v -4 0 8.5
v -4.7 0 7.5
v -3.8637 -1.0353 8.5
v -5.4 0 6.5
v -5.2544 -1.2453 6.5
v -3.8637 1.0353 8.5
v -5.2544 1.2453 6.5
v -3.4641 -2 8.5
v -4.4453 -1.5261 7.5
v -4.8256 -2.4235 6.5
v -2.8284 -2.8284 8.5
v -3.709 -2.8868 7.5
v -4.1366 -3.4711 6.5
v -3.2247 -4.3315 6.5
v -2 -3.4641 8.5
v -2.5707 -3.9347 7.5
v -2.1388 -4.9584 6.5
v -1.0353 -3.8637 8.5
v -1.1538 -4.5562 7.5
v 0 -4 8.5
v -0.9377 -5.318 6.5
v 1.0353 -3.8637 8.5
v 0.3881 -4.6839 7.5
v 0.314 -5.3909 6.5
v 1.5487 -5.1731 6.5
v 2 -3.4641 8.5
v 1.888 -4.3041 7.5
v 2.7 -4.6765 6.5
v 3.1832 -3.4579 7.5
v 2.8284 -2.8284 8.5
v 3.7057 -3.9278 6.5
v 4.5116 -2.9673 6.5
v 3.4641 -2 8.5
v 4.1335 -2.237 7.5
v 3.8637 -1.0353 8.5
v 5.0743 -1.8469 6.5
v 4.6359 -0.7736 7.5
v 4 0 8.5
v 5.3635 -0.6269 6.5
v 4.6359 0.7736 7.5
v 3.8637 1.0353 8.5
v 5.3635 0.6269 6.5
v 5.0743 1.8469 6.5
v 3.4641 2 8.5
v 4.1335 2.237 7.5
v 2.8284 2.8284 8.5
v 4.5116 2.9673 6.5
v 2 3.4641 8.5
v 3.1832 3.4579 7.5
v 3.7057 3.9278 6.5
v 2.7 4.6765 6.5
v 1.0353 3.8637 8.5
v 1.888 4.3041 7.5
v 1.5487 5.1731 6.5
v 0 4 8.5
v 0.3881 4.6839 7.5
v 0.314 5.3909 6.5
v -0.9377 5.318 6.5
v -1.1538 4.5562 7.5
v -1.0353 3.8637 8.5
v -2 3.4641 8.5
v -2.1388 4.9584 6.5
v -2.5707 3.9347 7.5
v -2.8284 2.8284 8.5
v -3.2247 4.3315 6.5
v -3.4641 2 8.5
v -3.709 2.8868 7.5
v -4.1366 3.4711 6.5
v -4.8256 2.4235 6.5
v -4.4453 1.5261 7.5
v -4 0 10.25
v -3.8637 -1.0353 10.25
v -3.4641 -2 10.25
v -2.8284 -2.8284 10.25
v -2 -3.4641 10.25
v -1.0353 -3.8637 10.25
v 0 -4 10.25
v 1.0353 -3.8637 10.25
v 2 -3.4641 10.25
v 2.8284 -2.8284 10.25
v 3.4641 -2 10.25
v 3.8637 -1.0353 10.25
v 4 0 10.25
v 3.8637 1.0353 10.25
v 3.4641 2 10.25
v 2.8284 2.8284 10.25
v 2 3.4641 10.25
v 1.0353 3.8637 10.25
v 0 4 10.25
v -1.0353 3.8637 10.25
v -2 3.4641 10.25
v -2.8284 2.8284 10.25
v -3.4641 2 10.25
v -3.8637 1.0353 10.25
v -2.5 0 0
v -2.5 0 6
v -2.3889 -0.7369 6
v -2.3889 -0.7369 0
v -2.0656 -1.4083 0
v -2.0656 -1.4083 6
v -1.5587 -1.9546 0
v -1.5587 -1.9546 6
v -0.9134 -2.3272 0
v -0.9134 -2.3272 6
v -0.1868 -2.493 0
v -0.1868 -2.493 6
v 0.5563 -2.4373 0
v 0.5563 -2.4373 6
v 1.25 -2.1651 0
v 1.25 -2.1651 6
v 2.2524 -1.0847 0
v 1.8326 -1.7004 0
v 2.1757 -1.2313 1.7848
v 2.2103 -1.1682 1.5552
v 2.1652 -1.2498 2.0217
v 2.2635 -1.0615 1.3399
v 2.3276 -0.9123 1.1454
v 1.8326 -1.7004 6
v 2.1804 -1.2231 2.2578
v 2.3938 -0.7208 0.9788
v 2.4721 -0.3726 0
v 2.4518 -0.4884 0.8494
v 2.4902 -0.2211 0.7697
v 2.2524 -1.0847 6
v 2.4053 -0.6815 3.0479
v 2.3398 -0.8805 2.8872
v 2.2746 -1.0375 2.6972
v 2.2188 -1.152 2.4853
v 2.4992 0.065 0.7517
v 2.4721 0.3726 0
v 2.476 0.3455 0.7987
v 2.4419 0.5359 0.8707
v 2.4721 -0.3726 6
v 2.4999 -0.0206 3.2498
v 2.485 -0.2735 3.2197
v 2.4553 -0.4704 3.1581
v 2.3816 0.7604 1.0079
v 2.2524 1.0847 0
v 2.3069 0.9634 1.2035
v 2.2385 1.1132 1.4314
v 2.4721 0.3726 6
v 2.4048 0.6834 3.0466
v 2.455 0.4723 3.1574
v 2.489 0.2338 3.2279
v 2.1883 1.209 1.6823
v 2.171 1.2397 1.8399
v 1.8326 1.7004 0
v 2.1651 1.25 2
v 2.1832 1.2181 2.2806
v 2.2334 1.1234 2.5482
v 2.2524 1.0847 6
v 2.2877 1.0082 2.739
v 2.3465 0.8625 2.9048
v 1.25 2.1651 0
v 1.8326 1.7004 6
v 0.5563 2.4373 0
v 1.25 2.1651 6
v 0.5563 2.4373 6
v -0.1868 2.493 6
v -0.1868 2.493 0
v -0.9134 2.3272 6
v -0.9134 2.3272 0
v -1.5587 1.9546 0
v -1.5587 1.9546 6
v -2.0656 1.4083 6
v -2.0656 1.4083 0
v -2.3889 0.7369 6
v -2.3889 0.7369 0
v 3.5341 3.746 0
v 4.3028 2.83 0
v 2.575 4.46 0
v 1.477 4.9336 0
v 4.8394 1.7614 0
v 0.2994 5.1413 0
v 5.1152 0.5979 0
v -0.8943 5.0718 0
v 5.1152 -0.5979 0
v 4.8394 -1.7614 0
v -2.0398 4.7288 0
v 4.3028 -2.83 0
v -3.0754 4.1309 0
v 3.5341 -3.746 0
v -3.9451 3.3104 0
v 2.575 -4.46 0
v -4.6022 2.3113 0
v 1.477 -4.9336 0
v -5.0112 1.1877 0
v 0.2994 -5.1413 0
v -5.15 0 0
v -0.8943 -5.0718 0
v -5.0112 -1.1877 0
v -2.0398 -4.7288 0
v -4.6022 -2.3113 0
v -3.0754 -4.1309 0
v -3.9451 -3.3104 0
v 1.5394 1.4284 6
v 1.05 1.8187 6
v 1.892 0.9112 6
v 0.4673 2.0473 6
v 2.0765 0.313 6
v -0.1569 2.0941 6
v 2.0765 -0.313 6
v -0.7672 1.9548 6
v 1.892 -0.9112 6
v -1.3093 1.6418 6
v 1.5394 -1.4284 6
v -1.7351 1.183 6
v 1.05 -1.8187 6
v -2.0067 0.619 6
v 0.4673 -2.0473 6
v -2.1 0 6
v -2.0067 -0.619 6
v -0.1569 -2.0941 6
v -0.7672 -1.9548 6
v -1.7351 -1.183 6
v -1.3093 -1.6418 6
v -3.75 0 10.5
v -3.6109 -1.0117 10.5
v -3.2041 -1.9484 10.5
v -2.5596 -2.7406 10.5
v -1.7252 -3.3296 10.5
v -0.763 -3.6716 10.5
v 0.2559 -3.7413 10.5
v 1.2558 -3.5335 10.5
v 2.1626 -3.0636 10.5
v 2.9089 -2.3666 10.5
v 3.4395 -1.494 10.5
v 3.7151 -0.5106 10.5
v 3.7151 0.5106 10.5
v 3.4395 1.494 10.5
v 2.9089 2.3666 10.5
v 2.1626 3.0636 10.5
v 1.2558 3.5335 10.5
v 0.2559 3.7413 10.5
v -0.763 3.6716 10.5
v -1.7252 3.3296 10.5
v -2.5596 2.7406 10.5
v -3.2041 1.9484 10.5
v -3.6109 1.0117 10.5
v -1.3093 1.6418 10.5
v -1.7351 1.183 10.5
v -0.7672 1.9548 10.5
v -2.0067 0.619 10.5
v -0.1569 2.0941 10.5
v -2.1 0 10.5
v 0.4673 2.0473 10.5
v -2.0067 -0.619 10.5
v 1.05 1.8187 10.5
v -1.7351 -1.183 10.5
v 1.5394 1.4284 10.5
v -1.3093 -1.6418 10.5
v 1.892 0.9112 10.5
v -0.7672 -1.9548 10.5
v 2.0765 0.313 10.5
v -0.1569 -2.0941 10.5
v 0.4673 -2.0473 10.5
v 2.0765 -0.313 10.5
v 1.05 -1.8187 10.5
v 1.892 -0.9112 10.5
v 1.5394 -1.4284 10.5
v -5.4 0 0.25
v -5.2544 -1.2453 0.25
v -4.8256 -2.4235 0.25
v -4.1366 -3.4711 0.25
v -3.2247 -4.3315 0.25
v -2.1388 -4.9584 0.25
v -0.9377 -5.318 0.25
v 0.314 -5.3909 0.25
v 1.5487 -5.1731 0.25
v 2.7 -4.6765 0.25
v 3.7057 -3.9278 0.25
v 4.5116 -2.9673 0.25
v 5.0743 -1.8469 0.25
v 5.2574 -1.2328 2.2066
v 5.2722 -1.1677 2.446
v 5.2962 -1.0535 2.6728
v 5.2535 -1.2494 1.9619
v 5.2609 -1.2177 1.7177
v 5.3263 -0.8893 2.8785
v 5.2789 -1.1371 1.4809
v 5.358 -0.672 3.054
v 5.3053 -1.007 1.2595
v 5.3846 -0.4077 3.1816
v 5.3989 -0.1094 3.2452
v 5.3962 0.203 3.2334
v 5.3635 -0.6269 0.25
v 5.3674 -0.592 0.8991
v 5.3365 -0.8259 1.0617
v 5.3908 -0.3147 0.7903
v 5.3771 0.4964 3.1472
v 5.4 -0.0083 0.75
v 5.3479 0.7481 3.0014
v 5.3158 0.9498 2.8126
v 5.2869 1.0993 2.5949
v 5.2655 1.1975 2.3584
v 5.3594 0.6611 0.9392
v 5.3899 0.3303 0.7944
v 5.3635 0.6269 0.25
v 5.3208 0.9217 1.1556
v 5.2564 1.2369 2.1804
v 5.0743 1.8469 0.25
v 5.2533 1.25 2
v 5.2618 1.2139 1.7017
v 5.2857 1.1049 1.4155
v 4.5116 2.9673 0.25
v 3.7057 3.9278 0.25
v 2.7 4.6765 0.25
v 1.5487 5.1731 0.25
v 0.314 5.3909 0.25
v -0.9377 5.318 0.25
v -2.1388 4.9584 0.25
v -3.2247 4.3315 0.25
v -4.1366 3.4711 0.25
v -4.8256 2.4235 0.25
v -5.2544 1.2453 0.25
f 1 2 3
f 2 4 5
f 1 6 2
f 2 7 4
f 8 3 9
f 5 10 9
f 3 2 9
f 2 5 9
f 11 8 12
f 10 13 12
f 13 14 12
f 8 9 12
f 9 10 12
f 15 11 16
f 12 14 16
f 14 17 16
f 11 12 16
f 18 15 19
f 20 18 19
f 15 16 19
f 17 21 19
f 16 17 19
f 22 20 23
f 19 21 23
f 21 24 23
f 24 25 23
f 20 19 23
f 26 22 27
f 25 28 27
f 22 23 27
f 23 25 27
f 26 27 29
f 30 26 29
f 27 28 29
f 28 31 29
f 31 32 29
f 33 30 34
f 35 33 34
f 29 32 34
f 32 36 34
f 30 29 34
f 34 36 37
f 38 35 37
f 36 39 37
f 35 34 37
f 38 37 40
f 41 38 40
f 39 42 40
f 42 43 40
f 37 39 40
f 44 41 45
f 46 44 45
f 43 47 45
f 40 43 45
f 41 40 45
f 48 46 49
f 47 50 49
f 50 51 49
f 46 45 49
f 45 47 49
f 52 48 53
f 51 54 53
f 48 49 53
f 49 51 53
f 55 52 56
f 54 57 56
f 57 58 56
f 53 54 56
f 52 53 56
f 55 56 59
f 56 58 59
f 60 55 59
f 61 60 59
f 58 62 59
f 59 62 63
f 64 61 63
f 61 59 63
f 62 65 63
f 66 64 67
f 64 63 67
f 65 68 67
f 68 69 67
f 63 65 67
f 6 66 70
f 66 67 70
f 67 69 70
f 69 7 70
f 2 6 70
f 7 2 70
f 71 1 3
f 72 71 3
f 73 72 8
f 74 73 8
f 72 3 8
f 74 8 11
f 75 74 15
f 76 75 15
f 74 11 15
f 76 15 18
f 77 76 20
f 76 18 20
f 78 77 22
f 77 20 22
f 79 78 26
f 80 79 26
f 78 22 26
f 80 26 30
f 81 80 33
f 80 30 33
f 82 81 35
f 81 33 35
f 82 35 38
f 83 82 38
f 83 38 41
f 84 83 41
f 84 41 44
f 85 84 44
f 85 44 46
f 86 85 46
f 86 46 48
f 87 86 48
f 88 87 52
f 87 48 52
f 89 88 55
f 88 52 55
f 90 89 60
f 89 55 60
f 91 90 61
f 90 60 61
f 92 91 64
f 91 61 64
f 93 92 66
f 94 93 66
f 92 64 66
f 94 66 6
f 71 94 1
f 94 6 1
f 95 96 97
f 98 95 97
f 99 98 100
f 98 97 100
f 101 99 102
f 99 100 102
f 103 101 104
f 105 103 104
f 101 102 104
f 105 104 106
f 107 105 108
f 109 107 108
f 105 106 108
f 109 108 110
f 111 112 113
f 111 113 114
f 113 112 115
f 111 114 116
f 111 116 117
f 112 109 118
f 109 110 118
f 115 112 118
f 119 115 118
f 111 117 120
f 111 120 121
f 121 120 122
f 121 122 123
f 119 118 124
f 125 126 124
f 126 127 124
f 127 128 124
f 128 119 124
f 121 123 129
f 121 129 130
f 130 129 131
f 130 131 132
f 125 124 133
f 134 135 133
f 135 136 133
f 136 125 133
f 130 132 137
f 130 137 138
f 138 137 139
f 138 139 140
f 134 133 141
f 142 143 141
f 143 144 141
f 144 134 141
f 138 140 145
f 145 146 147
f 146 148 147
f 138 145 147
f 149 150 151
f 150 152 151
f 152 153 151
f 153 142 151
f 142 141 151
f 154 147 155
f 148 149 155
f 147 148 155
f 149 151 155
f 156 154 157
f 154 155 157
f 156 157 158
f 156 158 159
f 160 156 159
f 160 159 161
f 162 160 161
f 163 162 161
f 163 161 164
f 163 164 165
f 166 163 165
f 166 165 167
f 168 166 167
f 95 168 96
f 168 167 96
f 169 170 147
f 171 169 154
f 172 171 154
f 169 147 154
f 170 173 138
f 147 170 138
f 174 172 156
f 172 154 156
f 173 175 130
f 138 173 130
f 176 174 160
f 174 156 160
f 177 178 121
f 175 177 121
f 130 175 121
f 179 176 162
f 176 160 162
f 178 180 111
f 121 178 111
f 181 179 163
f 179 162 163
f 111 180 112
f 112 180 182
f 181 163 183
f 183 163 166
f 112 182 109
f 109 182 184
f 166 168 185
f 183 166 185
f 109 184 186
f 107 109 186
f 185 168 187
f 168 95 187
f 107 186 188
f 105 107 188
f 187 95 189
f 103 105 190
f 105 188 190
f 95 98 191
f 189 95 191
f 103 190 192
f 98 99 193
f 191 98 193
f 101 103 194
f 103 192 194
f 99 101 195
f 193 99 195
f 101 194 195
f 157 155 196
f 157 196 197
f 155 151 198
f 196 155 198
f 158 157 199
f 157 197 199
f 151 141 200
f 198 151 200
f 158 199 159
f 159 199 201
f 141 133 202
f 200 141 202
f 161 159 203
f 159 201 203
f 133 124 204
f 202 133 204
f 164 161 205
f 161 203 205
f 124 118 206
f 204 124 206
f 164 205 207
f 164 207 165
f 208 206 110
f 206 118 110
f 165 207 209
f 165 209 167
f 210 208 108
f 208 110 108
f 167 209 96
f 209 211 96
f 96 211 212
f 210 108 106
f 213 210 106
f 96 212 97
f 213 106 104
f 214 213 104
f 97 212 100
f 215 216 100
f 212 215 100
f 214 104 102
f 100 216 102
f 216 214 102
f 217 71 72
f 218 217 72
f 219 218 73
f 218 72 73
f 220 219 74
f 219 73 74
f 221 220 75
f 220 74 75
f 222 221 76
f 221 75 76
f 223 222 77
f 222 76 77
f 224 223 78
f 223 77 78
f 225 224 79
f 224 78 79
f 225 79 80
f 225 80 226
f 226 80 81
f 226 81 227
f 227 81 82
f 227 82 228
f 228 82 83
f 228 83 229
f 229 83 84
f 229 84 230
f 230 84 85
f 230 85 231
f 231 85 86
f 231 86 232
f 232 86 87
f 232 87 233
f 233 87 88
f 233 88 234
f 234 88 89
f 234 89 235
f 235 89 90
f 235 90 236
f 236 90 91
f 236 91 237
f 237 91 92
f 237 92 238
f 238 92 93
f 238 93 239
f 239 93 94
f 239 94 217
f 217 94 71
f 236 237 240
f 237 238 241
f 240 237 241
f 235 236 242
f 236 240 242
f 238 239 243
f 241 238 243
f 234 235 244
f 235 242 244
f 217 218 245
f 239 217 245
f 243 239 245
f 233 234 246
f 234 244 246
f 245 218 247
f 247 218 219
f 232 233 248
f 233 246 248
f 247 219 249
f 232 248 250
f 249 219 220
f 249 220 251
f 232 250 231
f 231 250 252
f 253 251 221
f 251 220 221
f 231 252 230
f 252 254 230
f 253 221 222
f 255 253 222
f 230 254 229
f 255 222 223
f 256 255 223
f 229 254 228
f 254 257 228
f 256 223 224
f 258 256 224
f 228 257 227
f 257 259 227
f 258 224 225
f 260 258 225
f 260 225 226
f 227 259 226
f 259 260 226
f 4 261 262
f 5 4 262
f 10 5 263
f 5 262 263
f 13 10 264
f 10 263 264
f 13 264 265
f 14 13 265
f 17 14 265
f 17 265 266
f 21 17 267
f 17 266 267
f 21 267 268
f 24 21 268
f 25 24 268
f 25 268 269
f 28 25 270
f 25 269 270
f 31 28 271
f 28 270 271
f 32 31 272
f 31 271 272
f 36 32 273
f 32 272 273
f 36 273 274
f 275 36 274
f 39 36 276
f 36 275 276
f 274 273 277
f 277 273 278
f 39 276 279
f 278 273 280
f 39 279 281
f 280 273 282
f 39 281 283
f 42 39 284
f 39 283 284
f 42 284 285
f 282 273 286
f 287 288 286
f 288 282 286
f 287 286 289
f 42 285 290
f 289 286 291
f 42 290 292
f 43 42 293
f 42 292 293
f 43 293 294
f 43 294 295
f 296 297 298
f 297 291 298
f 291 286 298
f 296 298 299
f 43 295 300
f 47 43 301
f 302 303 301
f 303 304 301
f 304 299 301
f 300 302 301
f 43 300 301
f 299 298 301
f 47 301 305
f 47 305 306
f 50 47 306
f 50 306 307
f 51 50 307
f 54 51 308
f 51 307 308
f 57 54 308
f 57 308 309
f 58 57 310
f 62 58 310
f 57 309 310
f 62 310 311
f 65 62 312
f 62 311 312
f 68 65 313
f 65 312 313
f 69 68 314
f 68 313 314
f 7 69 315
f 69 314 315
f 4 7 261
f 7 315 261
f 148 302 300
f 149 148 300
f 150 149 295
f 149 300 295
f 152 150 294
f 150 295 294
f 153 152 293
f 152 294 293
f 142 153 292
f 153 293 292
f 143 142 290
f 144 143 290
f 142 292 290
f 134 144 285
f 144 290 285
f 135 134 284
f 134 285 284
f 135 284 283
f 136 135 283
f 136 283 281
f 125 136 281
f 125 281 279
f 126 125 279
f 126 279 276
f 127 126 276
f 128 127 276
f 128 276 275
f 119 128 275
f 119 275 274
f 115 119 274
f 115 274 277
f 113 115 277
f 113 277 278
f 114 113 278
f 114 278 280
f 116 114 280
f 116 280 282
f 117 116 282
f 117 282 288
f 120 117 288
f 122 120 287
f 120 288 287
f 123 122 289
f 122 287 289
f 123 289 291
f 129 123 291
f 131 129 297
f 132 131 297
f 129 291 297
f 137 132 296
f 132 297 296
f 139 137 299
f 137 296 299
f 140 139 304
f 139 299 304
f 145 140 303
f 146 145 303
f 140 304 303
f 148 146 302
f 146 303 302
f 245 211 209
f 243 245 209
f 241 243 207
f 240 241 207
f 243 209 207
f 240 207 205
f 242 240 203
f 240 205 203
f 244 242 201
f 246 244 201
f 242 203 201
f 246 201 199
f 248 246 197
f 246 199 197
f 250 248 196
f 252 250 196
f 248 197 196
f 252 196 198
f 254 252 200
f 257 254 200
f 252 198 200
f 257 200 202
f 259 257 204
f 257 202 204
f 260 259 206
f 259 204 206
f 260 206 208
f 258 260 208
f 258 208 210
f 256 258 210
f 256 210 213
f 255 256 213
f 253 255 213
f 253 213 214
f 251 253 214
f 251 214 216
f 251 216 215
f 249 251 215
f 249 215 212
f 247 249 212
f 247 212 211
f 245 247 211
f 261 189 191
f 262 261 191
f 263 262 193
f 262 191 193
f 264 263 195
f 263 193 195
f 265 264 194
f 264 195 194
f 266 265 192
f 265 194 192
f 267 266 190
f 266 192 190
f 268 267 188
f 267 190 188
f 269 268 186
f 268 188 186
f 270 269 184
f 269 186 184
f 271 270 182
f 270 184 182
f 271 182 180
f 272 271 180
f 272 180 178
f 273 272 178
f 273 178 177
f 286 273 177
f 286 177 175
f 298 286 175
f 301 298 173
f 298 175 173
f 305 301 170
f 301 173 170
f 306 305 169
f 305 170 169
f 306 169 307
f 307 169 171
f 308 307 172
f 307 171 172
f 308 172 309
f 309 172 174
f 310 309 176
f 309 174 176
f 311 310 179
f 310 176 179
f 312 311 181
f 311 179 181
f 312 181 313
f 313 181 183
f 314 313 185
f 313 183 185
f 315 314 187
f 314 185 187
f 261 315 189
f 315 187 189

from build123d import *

# Parameters (mm, degrees)
CONNECTOR_M5X0_8_TAPPED_HOLE_D        = 4.2
CONNECTOR_M5X0_8_TAPPED_HOLE_DEPTH    = 7.4
CONNECTOR_M5X0_8_TAPPED_HOLE_TIP      = 1.2618073
SET_SCREW_1_M3X0_5_TAPPED_HOLE_REACH  = 16.767
SET_SCREW_1_M3X0_5_TAPPED_HOLE_BORE_R = 1.25
EDGE_CHAMFERS_SIZE                    = 0.25


with BuildPart() as part:
    # Body Sketch → Body Revolve (revolve)
    with BuildSketch(Plane(origin=(0, 0, 0), x_dir=(-1, 0, 0), z_dir=(0, 1, 0))):
        Polygon((1, 10.5), (4, 10.5), (4, 8.5), (5.4, 6.5), (5.4, 0), (2.5, 0), (2.5, 6), (1, 6), align=None)
    revolve(axis=Axis((0, 0, 0), (0, 0, 1)))

    # Connector M5x0.8 Tapped Hole
    with Locations(Plane.XY.offset(10.5)):
        with Locations((0, 0)):
            Hole(CONNECTOR_M5X0_8_TAPPED_HOLE_D / 2, depth=CONNECTOR_M5X0_8_TAPPED_HOLE_DEPTH)
            with Locations((0, 0, -(CONNECTOR_M5X0_8_TAPPED_HOLE_DEPTH + CONNECTOR_M5X0_8_TAPPED_HOLE_TIP / 2))):  # 118° drill point
                Cone(0, CONNECTOR_M5X0_8_TAPPED_HOLE_D / 2, CONNECTOR_M5X0_8_TAPPED_HOLE_TIP, mode=Mode.SUBTRACT)

    # Set Screw 1 M3x0.5 Tapped Hole bore (on position points) → Set Screw 1 M3x0.5 Tapped Hole (cut, up to next)
    with BuildSketch(Plane(origin=(5.4, 0, 2), x_dir=(0, 1, 0), z_dir=(1, 0, 0)), mode=Mode.PRIVATE) as set_screw_1_m3x0_5_tapped_hole_sk1:
        Circle(SET_SCREW_1_M3X0_5_TAPPED_HOLE_BORE_R)
    set_screw_1_m3x0_5_tapped_hole_tool1 = extrude(set_screw_1_m3x0_5_tapped_hole_sk1.sketch, amount=-SET_SCREW_1_M3X0_5_TAPPED_HOLE_REACH, mode=Mode.PRIVATE) & part.part
    add(set_screw_1_m3x0_5_tapped_hole_tool1.solids().sort_by_distance((5.4, 0, 2))[0], mode=Mode.SUBTRACT)

    # Edge Chamfers
    edge_chamfers_edges = [part.edges().sort_by_distance(p)[0] for p in [
        (5.4, 0, 0),
        (4, 0, 10.5),
    ]]
    chamfer(edge_chamfers_edges, length=EDGE_CHAMFERS_SIZE)


solid = part.part
